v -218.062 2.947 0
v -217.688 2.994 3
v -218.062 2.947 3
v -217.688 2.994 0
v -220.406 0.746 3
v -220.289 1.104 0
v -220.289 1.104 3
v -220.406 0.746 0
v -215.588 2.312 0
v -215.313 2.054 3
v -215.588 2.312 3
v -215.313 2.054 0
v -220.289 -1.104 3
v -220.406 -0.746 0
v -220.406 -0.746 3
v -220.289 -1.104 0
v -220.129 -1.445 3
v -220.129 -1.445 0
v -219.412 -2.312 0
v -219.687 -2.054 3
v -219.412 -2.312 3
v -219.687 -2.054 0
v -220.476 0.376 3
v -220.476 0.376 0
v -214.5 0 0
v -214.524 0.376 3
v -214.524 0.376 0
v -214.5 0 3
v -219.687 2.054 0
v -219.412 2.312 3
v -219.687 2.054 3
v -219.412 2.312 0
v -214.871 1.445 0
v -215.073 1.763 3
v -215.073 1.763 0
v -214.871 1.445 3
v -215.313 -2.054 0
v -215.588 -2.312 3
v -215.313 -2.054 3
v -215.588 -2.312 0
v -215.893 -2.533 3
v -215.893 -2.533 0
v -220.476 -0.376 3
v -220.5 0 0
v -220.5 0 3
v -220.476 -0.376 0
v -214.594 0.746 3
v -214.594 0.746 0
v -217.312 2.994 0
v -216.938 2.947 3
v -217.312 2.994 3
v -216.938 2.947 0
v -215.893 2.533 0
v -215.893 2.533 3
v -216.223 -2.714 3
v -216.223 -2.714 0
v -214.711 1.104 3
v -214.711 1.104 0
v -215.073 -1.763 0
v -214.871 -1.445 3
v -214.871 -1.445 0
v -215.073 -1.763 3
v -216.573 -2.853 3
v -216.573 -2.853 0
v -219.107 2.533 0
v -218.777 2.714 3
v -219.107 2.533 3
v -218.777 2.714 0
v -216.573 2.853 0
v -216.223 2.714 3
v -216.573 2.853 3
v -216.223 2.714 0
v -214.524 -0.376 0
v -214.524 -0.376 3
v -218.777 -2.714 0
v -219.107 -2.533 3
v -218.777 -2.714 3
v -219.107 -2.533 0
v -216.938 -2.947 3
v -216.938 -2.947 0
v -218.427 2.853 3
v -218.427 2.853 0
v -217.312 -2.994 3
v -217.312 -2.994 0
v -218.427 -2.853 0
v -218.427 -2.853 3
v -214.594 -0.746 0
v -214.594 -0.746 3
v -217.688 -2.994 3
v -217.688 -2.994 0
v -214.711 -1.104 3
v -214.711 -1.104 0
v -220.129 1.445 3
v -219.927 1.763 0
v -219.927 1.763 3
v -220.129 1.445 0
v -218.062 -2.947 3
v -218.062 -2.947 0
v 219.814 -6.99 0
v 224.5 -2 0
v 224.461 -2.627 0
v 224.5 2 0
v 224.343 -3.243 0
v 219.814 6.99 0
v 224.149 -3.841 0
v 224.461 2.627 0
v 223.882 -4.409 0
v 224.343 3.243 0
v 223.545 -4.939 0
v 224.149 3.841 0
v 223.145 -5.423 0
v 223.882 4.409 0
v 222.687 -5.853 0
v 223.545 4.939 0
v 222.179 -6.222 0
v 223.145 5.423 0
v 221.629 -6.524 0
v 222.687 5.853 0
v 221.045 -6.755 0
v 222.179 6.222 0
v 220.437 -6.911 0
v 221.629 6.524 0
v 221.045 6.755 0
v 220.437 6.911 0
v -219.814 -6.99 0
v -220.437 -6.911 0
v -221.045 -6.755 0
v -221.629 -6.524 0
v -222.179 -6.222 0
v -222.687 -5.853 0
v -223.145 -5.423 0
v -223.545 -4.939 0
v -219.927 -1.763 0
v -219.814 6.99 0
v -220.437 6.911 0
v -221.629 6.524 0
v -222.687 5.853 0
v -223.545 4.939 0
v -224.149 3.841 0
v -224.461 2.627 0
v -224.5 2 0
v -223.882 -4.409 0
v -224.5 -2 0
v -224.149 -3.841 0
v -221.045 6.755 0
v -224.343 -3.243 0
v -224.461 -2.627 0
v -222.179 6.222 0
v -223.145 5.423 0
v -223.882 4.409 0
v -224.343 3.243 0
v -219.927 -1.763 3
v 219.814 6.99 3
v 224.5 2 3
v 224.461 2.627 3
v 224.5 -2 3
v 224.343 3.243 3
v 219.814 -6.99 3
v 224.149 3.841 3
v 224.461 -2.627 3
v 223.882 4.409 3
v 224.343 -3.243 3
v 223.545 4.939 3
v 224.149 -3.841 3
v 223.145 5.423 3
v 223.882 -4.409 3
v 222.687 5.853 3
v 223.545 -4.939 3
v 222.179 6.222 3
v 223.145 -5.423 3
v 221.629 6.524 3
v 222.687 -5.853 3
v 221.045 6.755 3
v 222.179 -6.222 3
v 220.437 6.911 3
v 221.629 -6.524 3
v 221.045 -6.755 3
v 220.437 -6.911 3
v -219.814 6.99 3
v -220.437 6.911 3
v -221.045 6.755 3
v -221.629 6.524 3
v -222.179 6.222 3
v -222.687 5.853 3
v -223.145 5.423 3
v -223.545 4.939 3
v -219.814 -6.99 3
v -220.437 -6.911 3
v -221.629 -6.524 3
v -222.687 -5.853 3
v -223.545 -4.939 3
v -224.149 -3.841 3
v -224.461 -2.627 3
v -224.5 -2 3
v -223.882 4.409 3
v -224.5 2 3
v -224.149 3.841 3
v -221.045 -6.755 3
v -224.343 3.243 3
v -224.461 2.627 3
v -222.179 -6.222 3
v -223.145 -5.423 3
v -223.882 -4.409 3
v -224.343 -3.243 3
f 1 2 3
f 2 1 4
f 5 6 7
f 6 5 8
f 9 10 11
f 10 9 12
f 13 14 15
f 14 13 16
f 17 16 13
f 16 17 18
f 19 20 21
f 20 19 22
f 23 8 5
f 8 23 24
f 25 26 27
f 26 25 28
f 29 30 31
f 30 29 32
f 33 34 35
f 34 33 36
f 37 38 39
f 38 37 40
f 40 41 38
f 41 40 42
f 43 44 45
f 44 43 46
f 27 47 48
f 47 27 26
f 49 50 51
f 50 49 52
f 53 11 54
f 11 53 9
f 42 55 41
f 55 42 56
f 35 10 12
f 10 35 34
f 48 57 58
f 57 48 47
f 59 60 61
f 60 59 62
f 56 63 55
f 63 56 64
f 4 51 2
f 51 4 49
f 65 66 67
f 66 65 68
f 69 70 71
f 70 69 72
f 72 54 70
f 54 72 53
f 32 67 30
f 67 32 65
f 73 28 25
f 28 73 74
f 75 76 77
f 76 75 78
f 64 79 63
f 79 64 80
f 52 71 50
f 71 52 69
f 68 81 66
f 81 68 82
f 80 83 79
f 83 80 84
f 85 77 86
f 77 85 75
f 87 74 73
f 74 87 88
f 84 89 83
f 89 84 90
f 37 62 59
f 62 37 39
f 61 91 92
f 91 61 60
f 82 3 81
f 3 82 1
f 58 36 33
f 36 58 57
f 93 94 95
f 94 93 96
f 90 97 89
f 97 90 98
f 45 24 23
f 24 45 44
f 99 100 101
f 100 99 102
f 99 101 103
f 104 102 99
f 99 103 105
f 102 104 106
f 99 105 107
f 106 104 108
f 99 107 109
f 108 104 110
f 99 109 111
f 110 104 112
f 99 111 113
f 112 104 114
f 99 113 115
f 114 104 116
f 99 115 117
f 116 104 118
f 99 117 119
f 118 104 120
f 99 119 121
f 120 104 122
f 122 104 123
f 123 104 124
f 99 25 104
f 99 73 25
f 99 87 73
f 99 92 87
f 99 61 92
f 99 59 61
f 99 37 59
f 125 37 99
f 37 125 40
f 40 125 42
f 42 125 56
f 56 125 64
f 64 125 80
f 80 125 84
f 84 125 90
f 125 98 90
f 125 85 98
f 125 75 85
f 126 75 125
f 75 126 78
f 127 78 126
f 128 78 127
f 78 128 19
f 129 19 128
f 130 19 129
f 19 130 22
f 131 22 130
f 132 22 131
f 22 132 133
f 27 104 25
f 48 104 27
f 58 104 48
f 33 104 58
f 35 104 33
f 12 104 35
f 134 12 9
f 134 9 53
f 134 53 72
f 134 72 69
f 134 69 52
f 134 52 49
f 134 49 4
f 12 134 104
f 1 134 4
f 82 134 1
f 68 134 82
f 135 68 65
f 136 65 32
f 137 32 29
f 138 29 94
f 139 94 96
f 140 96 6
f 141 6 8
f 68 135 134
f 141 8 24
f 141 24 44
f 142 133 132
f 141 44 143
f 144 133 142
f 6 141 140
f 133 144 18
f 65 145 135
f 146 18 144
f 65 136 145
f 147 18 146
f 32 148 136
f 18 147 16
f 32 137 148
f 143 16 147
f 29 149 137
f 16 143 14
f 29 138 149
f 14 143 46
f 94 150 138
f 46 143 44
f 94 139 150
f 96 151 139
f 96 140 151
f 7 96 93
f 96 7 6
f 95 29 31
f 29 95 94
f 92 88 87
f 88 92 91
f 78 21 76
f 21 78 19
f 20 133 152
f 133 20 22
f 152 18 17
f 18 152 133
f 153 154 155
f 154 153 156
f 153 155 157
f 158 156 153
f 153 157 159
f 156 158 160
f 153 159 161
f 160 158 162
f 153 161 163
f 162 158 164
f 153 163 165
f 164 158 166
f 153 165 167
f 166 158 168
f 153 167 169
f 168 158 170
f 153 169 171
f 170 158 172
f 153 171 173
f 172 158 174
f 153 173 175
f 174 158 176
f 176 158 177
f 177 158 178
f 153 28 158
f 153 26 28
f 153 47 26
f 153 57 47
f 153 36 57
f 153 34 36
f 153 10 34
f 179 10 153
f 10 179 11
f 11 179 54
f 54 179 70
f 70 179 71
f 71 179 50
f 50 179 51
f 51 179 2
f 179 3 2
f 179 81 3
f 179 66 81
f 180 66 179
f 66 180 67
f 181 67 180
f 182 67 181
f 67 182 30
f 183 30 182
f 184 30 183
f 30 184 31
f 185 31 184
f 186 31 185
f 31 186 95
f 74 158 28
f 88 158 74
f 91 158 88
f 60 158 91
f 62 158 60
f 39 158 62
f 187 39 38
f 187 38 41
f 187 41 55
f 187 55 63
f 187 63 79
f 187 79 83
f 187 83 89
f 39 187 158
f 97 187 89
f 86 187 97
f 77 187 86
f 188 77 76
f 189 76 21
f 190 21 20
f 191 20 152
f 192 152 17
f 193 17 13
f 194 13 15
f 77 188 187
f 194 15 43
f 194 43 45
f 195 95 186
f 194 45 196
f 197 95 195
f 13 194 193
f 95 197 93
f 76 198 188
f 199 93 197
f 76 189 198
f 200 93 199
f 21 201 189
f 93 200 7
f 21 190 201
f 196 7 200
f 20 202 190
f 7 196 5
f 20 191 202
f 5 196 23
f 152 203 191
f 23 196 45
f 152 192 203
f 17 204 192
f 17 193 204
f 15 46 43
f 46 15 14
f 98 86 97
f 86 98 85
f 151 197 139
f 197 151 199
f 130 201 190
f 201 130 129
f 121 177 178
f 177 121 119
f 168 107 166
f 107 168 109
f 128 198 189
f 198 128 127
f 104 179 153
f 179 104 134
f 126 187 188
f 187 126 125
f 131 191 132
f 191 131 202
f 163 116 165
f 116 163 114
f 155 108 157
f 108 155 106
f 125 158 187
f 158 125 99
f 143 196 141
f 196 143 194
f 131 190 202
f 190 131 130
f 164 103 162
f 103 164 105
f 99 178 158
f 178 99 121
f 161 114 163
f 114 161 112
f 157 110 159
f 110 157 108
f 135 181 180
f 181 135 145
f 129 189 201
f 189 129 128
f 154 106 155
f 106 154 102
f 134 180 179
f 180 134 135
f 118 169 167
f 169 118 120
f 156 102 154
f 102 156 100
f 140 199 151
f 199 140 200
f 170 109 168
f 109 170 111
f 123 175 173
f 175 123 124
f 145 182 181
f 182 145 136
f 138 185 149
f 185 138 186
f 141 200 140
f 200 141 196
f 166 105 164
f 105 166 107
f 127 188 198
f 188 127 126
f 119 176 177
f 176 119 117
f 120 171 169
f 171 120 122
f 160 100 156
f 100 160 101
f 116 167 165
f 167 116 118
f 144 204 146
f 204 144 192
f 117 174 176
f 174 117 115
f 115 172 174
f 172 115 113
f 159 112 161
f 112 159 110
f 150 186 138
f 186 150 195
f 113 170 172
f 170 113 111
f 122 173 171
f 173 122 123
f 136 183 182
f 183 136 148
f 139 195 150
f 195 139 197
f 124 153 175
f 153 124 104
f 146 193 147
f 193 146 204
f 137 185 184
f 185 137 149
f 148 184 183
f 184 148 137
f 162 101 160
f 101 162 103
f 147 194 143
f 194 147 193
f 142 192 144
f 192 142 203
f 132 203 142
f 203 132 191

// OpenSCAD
$fn = 50;


difference() {
	union() {
		hull() {
			translate(v = [-219.5000000000, 2.0000000000, 0]) {
				cylinder(h = 3, r = 5);
			}
			translate(v = [219.5000000000, 2.0000000000, 0]) {
				cylinder(h = 3, r = 5);
			}
			translate(v = [-219.5000000000, -2.0000000000, 0]) {
				cylinder(h = 3, r = 5);
			}
			translate(v = [219.5000000000, -2.0000000000, 0]) {
				cylinder(h = 3, r = 5);
			}
		}
	}
	union() {
		translate(v = [-217.5000000000, 0.0000000000, 0]) {
			cylinder(h = 3, r = 3.0000000000);
		}
		translate(v = [-217.5000000000, 0.0000000000, 0]) {
			cylinder(h = 3, r = 1.5000000000);
		}
		translate(v = [-217.5000000000, 0.0000000000, 0]) {
			cylinder(h = 3, r = 1.5000000000);
		}
		translate(v = [-217.5000000000, 0.0000000000, 0]) {
			cylinder(h = 3, r = 1.5000000000);
		}
	}
}
